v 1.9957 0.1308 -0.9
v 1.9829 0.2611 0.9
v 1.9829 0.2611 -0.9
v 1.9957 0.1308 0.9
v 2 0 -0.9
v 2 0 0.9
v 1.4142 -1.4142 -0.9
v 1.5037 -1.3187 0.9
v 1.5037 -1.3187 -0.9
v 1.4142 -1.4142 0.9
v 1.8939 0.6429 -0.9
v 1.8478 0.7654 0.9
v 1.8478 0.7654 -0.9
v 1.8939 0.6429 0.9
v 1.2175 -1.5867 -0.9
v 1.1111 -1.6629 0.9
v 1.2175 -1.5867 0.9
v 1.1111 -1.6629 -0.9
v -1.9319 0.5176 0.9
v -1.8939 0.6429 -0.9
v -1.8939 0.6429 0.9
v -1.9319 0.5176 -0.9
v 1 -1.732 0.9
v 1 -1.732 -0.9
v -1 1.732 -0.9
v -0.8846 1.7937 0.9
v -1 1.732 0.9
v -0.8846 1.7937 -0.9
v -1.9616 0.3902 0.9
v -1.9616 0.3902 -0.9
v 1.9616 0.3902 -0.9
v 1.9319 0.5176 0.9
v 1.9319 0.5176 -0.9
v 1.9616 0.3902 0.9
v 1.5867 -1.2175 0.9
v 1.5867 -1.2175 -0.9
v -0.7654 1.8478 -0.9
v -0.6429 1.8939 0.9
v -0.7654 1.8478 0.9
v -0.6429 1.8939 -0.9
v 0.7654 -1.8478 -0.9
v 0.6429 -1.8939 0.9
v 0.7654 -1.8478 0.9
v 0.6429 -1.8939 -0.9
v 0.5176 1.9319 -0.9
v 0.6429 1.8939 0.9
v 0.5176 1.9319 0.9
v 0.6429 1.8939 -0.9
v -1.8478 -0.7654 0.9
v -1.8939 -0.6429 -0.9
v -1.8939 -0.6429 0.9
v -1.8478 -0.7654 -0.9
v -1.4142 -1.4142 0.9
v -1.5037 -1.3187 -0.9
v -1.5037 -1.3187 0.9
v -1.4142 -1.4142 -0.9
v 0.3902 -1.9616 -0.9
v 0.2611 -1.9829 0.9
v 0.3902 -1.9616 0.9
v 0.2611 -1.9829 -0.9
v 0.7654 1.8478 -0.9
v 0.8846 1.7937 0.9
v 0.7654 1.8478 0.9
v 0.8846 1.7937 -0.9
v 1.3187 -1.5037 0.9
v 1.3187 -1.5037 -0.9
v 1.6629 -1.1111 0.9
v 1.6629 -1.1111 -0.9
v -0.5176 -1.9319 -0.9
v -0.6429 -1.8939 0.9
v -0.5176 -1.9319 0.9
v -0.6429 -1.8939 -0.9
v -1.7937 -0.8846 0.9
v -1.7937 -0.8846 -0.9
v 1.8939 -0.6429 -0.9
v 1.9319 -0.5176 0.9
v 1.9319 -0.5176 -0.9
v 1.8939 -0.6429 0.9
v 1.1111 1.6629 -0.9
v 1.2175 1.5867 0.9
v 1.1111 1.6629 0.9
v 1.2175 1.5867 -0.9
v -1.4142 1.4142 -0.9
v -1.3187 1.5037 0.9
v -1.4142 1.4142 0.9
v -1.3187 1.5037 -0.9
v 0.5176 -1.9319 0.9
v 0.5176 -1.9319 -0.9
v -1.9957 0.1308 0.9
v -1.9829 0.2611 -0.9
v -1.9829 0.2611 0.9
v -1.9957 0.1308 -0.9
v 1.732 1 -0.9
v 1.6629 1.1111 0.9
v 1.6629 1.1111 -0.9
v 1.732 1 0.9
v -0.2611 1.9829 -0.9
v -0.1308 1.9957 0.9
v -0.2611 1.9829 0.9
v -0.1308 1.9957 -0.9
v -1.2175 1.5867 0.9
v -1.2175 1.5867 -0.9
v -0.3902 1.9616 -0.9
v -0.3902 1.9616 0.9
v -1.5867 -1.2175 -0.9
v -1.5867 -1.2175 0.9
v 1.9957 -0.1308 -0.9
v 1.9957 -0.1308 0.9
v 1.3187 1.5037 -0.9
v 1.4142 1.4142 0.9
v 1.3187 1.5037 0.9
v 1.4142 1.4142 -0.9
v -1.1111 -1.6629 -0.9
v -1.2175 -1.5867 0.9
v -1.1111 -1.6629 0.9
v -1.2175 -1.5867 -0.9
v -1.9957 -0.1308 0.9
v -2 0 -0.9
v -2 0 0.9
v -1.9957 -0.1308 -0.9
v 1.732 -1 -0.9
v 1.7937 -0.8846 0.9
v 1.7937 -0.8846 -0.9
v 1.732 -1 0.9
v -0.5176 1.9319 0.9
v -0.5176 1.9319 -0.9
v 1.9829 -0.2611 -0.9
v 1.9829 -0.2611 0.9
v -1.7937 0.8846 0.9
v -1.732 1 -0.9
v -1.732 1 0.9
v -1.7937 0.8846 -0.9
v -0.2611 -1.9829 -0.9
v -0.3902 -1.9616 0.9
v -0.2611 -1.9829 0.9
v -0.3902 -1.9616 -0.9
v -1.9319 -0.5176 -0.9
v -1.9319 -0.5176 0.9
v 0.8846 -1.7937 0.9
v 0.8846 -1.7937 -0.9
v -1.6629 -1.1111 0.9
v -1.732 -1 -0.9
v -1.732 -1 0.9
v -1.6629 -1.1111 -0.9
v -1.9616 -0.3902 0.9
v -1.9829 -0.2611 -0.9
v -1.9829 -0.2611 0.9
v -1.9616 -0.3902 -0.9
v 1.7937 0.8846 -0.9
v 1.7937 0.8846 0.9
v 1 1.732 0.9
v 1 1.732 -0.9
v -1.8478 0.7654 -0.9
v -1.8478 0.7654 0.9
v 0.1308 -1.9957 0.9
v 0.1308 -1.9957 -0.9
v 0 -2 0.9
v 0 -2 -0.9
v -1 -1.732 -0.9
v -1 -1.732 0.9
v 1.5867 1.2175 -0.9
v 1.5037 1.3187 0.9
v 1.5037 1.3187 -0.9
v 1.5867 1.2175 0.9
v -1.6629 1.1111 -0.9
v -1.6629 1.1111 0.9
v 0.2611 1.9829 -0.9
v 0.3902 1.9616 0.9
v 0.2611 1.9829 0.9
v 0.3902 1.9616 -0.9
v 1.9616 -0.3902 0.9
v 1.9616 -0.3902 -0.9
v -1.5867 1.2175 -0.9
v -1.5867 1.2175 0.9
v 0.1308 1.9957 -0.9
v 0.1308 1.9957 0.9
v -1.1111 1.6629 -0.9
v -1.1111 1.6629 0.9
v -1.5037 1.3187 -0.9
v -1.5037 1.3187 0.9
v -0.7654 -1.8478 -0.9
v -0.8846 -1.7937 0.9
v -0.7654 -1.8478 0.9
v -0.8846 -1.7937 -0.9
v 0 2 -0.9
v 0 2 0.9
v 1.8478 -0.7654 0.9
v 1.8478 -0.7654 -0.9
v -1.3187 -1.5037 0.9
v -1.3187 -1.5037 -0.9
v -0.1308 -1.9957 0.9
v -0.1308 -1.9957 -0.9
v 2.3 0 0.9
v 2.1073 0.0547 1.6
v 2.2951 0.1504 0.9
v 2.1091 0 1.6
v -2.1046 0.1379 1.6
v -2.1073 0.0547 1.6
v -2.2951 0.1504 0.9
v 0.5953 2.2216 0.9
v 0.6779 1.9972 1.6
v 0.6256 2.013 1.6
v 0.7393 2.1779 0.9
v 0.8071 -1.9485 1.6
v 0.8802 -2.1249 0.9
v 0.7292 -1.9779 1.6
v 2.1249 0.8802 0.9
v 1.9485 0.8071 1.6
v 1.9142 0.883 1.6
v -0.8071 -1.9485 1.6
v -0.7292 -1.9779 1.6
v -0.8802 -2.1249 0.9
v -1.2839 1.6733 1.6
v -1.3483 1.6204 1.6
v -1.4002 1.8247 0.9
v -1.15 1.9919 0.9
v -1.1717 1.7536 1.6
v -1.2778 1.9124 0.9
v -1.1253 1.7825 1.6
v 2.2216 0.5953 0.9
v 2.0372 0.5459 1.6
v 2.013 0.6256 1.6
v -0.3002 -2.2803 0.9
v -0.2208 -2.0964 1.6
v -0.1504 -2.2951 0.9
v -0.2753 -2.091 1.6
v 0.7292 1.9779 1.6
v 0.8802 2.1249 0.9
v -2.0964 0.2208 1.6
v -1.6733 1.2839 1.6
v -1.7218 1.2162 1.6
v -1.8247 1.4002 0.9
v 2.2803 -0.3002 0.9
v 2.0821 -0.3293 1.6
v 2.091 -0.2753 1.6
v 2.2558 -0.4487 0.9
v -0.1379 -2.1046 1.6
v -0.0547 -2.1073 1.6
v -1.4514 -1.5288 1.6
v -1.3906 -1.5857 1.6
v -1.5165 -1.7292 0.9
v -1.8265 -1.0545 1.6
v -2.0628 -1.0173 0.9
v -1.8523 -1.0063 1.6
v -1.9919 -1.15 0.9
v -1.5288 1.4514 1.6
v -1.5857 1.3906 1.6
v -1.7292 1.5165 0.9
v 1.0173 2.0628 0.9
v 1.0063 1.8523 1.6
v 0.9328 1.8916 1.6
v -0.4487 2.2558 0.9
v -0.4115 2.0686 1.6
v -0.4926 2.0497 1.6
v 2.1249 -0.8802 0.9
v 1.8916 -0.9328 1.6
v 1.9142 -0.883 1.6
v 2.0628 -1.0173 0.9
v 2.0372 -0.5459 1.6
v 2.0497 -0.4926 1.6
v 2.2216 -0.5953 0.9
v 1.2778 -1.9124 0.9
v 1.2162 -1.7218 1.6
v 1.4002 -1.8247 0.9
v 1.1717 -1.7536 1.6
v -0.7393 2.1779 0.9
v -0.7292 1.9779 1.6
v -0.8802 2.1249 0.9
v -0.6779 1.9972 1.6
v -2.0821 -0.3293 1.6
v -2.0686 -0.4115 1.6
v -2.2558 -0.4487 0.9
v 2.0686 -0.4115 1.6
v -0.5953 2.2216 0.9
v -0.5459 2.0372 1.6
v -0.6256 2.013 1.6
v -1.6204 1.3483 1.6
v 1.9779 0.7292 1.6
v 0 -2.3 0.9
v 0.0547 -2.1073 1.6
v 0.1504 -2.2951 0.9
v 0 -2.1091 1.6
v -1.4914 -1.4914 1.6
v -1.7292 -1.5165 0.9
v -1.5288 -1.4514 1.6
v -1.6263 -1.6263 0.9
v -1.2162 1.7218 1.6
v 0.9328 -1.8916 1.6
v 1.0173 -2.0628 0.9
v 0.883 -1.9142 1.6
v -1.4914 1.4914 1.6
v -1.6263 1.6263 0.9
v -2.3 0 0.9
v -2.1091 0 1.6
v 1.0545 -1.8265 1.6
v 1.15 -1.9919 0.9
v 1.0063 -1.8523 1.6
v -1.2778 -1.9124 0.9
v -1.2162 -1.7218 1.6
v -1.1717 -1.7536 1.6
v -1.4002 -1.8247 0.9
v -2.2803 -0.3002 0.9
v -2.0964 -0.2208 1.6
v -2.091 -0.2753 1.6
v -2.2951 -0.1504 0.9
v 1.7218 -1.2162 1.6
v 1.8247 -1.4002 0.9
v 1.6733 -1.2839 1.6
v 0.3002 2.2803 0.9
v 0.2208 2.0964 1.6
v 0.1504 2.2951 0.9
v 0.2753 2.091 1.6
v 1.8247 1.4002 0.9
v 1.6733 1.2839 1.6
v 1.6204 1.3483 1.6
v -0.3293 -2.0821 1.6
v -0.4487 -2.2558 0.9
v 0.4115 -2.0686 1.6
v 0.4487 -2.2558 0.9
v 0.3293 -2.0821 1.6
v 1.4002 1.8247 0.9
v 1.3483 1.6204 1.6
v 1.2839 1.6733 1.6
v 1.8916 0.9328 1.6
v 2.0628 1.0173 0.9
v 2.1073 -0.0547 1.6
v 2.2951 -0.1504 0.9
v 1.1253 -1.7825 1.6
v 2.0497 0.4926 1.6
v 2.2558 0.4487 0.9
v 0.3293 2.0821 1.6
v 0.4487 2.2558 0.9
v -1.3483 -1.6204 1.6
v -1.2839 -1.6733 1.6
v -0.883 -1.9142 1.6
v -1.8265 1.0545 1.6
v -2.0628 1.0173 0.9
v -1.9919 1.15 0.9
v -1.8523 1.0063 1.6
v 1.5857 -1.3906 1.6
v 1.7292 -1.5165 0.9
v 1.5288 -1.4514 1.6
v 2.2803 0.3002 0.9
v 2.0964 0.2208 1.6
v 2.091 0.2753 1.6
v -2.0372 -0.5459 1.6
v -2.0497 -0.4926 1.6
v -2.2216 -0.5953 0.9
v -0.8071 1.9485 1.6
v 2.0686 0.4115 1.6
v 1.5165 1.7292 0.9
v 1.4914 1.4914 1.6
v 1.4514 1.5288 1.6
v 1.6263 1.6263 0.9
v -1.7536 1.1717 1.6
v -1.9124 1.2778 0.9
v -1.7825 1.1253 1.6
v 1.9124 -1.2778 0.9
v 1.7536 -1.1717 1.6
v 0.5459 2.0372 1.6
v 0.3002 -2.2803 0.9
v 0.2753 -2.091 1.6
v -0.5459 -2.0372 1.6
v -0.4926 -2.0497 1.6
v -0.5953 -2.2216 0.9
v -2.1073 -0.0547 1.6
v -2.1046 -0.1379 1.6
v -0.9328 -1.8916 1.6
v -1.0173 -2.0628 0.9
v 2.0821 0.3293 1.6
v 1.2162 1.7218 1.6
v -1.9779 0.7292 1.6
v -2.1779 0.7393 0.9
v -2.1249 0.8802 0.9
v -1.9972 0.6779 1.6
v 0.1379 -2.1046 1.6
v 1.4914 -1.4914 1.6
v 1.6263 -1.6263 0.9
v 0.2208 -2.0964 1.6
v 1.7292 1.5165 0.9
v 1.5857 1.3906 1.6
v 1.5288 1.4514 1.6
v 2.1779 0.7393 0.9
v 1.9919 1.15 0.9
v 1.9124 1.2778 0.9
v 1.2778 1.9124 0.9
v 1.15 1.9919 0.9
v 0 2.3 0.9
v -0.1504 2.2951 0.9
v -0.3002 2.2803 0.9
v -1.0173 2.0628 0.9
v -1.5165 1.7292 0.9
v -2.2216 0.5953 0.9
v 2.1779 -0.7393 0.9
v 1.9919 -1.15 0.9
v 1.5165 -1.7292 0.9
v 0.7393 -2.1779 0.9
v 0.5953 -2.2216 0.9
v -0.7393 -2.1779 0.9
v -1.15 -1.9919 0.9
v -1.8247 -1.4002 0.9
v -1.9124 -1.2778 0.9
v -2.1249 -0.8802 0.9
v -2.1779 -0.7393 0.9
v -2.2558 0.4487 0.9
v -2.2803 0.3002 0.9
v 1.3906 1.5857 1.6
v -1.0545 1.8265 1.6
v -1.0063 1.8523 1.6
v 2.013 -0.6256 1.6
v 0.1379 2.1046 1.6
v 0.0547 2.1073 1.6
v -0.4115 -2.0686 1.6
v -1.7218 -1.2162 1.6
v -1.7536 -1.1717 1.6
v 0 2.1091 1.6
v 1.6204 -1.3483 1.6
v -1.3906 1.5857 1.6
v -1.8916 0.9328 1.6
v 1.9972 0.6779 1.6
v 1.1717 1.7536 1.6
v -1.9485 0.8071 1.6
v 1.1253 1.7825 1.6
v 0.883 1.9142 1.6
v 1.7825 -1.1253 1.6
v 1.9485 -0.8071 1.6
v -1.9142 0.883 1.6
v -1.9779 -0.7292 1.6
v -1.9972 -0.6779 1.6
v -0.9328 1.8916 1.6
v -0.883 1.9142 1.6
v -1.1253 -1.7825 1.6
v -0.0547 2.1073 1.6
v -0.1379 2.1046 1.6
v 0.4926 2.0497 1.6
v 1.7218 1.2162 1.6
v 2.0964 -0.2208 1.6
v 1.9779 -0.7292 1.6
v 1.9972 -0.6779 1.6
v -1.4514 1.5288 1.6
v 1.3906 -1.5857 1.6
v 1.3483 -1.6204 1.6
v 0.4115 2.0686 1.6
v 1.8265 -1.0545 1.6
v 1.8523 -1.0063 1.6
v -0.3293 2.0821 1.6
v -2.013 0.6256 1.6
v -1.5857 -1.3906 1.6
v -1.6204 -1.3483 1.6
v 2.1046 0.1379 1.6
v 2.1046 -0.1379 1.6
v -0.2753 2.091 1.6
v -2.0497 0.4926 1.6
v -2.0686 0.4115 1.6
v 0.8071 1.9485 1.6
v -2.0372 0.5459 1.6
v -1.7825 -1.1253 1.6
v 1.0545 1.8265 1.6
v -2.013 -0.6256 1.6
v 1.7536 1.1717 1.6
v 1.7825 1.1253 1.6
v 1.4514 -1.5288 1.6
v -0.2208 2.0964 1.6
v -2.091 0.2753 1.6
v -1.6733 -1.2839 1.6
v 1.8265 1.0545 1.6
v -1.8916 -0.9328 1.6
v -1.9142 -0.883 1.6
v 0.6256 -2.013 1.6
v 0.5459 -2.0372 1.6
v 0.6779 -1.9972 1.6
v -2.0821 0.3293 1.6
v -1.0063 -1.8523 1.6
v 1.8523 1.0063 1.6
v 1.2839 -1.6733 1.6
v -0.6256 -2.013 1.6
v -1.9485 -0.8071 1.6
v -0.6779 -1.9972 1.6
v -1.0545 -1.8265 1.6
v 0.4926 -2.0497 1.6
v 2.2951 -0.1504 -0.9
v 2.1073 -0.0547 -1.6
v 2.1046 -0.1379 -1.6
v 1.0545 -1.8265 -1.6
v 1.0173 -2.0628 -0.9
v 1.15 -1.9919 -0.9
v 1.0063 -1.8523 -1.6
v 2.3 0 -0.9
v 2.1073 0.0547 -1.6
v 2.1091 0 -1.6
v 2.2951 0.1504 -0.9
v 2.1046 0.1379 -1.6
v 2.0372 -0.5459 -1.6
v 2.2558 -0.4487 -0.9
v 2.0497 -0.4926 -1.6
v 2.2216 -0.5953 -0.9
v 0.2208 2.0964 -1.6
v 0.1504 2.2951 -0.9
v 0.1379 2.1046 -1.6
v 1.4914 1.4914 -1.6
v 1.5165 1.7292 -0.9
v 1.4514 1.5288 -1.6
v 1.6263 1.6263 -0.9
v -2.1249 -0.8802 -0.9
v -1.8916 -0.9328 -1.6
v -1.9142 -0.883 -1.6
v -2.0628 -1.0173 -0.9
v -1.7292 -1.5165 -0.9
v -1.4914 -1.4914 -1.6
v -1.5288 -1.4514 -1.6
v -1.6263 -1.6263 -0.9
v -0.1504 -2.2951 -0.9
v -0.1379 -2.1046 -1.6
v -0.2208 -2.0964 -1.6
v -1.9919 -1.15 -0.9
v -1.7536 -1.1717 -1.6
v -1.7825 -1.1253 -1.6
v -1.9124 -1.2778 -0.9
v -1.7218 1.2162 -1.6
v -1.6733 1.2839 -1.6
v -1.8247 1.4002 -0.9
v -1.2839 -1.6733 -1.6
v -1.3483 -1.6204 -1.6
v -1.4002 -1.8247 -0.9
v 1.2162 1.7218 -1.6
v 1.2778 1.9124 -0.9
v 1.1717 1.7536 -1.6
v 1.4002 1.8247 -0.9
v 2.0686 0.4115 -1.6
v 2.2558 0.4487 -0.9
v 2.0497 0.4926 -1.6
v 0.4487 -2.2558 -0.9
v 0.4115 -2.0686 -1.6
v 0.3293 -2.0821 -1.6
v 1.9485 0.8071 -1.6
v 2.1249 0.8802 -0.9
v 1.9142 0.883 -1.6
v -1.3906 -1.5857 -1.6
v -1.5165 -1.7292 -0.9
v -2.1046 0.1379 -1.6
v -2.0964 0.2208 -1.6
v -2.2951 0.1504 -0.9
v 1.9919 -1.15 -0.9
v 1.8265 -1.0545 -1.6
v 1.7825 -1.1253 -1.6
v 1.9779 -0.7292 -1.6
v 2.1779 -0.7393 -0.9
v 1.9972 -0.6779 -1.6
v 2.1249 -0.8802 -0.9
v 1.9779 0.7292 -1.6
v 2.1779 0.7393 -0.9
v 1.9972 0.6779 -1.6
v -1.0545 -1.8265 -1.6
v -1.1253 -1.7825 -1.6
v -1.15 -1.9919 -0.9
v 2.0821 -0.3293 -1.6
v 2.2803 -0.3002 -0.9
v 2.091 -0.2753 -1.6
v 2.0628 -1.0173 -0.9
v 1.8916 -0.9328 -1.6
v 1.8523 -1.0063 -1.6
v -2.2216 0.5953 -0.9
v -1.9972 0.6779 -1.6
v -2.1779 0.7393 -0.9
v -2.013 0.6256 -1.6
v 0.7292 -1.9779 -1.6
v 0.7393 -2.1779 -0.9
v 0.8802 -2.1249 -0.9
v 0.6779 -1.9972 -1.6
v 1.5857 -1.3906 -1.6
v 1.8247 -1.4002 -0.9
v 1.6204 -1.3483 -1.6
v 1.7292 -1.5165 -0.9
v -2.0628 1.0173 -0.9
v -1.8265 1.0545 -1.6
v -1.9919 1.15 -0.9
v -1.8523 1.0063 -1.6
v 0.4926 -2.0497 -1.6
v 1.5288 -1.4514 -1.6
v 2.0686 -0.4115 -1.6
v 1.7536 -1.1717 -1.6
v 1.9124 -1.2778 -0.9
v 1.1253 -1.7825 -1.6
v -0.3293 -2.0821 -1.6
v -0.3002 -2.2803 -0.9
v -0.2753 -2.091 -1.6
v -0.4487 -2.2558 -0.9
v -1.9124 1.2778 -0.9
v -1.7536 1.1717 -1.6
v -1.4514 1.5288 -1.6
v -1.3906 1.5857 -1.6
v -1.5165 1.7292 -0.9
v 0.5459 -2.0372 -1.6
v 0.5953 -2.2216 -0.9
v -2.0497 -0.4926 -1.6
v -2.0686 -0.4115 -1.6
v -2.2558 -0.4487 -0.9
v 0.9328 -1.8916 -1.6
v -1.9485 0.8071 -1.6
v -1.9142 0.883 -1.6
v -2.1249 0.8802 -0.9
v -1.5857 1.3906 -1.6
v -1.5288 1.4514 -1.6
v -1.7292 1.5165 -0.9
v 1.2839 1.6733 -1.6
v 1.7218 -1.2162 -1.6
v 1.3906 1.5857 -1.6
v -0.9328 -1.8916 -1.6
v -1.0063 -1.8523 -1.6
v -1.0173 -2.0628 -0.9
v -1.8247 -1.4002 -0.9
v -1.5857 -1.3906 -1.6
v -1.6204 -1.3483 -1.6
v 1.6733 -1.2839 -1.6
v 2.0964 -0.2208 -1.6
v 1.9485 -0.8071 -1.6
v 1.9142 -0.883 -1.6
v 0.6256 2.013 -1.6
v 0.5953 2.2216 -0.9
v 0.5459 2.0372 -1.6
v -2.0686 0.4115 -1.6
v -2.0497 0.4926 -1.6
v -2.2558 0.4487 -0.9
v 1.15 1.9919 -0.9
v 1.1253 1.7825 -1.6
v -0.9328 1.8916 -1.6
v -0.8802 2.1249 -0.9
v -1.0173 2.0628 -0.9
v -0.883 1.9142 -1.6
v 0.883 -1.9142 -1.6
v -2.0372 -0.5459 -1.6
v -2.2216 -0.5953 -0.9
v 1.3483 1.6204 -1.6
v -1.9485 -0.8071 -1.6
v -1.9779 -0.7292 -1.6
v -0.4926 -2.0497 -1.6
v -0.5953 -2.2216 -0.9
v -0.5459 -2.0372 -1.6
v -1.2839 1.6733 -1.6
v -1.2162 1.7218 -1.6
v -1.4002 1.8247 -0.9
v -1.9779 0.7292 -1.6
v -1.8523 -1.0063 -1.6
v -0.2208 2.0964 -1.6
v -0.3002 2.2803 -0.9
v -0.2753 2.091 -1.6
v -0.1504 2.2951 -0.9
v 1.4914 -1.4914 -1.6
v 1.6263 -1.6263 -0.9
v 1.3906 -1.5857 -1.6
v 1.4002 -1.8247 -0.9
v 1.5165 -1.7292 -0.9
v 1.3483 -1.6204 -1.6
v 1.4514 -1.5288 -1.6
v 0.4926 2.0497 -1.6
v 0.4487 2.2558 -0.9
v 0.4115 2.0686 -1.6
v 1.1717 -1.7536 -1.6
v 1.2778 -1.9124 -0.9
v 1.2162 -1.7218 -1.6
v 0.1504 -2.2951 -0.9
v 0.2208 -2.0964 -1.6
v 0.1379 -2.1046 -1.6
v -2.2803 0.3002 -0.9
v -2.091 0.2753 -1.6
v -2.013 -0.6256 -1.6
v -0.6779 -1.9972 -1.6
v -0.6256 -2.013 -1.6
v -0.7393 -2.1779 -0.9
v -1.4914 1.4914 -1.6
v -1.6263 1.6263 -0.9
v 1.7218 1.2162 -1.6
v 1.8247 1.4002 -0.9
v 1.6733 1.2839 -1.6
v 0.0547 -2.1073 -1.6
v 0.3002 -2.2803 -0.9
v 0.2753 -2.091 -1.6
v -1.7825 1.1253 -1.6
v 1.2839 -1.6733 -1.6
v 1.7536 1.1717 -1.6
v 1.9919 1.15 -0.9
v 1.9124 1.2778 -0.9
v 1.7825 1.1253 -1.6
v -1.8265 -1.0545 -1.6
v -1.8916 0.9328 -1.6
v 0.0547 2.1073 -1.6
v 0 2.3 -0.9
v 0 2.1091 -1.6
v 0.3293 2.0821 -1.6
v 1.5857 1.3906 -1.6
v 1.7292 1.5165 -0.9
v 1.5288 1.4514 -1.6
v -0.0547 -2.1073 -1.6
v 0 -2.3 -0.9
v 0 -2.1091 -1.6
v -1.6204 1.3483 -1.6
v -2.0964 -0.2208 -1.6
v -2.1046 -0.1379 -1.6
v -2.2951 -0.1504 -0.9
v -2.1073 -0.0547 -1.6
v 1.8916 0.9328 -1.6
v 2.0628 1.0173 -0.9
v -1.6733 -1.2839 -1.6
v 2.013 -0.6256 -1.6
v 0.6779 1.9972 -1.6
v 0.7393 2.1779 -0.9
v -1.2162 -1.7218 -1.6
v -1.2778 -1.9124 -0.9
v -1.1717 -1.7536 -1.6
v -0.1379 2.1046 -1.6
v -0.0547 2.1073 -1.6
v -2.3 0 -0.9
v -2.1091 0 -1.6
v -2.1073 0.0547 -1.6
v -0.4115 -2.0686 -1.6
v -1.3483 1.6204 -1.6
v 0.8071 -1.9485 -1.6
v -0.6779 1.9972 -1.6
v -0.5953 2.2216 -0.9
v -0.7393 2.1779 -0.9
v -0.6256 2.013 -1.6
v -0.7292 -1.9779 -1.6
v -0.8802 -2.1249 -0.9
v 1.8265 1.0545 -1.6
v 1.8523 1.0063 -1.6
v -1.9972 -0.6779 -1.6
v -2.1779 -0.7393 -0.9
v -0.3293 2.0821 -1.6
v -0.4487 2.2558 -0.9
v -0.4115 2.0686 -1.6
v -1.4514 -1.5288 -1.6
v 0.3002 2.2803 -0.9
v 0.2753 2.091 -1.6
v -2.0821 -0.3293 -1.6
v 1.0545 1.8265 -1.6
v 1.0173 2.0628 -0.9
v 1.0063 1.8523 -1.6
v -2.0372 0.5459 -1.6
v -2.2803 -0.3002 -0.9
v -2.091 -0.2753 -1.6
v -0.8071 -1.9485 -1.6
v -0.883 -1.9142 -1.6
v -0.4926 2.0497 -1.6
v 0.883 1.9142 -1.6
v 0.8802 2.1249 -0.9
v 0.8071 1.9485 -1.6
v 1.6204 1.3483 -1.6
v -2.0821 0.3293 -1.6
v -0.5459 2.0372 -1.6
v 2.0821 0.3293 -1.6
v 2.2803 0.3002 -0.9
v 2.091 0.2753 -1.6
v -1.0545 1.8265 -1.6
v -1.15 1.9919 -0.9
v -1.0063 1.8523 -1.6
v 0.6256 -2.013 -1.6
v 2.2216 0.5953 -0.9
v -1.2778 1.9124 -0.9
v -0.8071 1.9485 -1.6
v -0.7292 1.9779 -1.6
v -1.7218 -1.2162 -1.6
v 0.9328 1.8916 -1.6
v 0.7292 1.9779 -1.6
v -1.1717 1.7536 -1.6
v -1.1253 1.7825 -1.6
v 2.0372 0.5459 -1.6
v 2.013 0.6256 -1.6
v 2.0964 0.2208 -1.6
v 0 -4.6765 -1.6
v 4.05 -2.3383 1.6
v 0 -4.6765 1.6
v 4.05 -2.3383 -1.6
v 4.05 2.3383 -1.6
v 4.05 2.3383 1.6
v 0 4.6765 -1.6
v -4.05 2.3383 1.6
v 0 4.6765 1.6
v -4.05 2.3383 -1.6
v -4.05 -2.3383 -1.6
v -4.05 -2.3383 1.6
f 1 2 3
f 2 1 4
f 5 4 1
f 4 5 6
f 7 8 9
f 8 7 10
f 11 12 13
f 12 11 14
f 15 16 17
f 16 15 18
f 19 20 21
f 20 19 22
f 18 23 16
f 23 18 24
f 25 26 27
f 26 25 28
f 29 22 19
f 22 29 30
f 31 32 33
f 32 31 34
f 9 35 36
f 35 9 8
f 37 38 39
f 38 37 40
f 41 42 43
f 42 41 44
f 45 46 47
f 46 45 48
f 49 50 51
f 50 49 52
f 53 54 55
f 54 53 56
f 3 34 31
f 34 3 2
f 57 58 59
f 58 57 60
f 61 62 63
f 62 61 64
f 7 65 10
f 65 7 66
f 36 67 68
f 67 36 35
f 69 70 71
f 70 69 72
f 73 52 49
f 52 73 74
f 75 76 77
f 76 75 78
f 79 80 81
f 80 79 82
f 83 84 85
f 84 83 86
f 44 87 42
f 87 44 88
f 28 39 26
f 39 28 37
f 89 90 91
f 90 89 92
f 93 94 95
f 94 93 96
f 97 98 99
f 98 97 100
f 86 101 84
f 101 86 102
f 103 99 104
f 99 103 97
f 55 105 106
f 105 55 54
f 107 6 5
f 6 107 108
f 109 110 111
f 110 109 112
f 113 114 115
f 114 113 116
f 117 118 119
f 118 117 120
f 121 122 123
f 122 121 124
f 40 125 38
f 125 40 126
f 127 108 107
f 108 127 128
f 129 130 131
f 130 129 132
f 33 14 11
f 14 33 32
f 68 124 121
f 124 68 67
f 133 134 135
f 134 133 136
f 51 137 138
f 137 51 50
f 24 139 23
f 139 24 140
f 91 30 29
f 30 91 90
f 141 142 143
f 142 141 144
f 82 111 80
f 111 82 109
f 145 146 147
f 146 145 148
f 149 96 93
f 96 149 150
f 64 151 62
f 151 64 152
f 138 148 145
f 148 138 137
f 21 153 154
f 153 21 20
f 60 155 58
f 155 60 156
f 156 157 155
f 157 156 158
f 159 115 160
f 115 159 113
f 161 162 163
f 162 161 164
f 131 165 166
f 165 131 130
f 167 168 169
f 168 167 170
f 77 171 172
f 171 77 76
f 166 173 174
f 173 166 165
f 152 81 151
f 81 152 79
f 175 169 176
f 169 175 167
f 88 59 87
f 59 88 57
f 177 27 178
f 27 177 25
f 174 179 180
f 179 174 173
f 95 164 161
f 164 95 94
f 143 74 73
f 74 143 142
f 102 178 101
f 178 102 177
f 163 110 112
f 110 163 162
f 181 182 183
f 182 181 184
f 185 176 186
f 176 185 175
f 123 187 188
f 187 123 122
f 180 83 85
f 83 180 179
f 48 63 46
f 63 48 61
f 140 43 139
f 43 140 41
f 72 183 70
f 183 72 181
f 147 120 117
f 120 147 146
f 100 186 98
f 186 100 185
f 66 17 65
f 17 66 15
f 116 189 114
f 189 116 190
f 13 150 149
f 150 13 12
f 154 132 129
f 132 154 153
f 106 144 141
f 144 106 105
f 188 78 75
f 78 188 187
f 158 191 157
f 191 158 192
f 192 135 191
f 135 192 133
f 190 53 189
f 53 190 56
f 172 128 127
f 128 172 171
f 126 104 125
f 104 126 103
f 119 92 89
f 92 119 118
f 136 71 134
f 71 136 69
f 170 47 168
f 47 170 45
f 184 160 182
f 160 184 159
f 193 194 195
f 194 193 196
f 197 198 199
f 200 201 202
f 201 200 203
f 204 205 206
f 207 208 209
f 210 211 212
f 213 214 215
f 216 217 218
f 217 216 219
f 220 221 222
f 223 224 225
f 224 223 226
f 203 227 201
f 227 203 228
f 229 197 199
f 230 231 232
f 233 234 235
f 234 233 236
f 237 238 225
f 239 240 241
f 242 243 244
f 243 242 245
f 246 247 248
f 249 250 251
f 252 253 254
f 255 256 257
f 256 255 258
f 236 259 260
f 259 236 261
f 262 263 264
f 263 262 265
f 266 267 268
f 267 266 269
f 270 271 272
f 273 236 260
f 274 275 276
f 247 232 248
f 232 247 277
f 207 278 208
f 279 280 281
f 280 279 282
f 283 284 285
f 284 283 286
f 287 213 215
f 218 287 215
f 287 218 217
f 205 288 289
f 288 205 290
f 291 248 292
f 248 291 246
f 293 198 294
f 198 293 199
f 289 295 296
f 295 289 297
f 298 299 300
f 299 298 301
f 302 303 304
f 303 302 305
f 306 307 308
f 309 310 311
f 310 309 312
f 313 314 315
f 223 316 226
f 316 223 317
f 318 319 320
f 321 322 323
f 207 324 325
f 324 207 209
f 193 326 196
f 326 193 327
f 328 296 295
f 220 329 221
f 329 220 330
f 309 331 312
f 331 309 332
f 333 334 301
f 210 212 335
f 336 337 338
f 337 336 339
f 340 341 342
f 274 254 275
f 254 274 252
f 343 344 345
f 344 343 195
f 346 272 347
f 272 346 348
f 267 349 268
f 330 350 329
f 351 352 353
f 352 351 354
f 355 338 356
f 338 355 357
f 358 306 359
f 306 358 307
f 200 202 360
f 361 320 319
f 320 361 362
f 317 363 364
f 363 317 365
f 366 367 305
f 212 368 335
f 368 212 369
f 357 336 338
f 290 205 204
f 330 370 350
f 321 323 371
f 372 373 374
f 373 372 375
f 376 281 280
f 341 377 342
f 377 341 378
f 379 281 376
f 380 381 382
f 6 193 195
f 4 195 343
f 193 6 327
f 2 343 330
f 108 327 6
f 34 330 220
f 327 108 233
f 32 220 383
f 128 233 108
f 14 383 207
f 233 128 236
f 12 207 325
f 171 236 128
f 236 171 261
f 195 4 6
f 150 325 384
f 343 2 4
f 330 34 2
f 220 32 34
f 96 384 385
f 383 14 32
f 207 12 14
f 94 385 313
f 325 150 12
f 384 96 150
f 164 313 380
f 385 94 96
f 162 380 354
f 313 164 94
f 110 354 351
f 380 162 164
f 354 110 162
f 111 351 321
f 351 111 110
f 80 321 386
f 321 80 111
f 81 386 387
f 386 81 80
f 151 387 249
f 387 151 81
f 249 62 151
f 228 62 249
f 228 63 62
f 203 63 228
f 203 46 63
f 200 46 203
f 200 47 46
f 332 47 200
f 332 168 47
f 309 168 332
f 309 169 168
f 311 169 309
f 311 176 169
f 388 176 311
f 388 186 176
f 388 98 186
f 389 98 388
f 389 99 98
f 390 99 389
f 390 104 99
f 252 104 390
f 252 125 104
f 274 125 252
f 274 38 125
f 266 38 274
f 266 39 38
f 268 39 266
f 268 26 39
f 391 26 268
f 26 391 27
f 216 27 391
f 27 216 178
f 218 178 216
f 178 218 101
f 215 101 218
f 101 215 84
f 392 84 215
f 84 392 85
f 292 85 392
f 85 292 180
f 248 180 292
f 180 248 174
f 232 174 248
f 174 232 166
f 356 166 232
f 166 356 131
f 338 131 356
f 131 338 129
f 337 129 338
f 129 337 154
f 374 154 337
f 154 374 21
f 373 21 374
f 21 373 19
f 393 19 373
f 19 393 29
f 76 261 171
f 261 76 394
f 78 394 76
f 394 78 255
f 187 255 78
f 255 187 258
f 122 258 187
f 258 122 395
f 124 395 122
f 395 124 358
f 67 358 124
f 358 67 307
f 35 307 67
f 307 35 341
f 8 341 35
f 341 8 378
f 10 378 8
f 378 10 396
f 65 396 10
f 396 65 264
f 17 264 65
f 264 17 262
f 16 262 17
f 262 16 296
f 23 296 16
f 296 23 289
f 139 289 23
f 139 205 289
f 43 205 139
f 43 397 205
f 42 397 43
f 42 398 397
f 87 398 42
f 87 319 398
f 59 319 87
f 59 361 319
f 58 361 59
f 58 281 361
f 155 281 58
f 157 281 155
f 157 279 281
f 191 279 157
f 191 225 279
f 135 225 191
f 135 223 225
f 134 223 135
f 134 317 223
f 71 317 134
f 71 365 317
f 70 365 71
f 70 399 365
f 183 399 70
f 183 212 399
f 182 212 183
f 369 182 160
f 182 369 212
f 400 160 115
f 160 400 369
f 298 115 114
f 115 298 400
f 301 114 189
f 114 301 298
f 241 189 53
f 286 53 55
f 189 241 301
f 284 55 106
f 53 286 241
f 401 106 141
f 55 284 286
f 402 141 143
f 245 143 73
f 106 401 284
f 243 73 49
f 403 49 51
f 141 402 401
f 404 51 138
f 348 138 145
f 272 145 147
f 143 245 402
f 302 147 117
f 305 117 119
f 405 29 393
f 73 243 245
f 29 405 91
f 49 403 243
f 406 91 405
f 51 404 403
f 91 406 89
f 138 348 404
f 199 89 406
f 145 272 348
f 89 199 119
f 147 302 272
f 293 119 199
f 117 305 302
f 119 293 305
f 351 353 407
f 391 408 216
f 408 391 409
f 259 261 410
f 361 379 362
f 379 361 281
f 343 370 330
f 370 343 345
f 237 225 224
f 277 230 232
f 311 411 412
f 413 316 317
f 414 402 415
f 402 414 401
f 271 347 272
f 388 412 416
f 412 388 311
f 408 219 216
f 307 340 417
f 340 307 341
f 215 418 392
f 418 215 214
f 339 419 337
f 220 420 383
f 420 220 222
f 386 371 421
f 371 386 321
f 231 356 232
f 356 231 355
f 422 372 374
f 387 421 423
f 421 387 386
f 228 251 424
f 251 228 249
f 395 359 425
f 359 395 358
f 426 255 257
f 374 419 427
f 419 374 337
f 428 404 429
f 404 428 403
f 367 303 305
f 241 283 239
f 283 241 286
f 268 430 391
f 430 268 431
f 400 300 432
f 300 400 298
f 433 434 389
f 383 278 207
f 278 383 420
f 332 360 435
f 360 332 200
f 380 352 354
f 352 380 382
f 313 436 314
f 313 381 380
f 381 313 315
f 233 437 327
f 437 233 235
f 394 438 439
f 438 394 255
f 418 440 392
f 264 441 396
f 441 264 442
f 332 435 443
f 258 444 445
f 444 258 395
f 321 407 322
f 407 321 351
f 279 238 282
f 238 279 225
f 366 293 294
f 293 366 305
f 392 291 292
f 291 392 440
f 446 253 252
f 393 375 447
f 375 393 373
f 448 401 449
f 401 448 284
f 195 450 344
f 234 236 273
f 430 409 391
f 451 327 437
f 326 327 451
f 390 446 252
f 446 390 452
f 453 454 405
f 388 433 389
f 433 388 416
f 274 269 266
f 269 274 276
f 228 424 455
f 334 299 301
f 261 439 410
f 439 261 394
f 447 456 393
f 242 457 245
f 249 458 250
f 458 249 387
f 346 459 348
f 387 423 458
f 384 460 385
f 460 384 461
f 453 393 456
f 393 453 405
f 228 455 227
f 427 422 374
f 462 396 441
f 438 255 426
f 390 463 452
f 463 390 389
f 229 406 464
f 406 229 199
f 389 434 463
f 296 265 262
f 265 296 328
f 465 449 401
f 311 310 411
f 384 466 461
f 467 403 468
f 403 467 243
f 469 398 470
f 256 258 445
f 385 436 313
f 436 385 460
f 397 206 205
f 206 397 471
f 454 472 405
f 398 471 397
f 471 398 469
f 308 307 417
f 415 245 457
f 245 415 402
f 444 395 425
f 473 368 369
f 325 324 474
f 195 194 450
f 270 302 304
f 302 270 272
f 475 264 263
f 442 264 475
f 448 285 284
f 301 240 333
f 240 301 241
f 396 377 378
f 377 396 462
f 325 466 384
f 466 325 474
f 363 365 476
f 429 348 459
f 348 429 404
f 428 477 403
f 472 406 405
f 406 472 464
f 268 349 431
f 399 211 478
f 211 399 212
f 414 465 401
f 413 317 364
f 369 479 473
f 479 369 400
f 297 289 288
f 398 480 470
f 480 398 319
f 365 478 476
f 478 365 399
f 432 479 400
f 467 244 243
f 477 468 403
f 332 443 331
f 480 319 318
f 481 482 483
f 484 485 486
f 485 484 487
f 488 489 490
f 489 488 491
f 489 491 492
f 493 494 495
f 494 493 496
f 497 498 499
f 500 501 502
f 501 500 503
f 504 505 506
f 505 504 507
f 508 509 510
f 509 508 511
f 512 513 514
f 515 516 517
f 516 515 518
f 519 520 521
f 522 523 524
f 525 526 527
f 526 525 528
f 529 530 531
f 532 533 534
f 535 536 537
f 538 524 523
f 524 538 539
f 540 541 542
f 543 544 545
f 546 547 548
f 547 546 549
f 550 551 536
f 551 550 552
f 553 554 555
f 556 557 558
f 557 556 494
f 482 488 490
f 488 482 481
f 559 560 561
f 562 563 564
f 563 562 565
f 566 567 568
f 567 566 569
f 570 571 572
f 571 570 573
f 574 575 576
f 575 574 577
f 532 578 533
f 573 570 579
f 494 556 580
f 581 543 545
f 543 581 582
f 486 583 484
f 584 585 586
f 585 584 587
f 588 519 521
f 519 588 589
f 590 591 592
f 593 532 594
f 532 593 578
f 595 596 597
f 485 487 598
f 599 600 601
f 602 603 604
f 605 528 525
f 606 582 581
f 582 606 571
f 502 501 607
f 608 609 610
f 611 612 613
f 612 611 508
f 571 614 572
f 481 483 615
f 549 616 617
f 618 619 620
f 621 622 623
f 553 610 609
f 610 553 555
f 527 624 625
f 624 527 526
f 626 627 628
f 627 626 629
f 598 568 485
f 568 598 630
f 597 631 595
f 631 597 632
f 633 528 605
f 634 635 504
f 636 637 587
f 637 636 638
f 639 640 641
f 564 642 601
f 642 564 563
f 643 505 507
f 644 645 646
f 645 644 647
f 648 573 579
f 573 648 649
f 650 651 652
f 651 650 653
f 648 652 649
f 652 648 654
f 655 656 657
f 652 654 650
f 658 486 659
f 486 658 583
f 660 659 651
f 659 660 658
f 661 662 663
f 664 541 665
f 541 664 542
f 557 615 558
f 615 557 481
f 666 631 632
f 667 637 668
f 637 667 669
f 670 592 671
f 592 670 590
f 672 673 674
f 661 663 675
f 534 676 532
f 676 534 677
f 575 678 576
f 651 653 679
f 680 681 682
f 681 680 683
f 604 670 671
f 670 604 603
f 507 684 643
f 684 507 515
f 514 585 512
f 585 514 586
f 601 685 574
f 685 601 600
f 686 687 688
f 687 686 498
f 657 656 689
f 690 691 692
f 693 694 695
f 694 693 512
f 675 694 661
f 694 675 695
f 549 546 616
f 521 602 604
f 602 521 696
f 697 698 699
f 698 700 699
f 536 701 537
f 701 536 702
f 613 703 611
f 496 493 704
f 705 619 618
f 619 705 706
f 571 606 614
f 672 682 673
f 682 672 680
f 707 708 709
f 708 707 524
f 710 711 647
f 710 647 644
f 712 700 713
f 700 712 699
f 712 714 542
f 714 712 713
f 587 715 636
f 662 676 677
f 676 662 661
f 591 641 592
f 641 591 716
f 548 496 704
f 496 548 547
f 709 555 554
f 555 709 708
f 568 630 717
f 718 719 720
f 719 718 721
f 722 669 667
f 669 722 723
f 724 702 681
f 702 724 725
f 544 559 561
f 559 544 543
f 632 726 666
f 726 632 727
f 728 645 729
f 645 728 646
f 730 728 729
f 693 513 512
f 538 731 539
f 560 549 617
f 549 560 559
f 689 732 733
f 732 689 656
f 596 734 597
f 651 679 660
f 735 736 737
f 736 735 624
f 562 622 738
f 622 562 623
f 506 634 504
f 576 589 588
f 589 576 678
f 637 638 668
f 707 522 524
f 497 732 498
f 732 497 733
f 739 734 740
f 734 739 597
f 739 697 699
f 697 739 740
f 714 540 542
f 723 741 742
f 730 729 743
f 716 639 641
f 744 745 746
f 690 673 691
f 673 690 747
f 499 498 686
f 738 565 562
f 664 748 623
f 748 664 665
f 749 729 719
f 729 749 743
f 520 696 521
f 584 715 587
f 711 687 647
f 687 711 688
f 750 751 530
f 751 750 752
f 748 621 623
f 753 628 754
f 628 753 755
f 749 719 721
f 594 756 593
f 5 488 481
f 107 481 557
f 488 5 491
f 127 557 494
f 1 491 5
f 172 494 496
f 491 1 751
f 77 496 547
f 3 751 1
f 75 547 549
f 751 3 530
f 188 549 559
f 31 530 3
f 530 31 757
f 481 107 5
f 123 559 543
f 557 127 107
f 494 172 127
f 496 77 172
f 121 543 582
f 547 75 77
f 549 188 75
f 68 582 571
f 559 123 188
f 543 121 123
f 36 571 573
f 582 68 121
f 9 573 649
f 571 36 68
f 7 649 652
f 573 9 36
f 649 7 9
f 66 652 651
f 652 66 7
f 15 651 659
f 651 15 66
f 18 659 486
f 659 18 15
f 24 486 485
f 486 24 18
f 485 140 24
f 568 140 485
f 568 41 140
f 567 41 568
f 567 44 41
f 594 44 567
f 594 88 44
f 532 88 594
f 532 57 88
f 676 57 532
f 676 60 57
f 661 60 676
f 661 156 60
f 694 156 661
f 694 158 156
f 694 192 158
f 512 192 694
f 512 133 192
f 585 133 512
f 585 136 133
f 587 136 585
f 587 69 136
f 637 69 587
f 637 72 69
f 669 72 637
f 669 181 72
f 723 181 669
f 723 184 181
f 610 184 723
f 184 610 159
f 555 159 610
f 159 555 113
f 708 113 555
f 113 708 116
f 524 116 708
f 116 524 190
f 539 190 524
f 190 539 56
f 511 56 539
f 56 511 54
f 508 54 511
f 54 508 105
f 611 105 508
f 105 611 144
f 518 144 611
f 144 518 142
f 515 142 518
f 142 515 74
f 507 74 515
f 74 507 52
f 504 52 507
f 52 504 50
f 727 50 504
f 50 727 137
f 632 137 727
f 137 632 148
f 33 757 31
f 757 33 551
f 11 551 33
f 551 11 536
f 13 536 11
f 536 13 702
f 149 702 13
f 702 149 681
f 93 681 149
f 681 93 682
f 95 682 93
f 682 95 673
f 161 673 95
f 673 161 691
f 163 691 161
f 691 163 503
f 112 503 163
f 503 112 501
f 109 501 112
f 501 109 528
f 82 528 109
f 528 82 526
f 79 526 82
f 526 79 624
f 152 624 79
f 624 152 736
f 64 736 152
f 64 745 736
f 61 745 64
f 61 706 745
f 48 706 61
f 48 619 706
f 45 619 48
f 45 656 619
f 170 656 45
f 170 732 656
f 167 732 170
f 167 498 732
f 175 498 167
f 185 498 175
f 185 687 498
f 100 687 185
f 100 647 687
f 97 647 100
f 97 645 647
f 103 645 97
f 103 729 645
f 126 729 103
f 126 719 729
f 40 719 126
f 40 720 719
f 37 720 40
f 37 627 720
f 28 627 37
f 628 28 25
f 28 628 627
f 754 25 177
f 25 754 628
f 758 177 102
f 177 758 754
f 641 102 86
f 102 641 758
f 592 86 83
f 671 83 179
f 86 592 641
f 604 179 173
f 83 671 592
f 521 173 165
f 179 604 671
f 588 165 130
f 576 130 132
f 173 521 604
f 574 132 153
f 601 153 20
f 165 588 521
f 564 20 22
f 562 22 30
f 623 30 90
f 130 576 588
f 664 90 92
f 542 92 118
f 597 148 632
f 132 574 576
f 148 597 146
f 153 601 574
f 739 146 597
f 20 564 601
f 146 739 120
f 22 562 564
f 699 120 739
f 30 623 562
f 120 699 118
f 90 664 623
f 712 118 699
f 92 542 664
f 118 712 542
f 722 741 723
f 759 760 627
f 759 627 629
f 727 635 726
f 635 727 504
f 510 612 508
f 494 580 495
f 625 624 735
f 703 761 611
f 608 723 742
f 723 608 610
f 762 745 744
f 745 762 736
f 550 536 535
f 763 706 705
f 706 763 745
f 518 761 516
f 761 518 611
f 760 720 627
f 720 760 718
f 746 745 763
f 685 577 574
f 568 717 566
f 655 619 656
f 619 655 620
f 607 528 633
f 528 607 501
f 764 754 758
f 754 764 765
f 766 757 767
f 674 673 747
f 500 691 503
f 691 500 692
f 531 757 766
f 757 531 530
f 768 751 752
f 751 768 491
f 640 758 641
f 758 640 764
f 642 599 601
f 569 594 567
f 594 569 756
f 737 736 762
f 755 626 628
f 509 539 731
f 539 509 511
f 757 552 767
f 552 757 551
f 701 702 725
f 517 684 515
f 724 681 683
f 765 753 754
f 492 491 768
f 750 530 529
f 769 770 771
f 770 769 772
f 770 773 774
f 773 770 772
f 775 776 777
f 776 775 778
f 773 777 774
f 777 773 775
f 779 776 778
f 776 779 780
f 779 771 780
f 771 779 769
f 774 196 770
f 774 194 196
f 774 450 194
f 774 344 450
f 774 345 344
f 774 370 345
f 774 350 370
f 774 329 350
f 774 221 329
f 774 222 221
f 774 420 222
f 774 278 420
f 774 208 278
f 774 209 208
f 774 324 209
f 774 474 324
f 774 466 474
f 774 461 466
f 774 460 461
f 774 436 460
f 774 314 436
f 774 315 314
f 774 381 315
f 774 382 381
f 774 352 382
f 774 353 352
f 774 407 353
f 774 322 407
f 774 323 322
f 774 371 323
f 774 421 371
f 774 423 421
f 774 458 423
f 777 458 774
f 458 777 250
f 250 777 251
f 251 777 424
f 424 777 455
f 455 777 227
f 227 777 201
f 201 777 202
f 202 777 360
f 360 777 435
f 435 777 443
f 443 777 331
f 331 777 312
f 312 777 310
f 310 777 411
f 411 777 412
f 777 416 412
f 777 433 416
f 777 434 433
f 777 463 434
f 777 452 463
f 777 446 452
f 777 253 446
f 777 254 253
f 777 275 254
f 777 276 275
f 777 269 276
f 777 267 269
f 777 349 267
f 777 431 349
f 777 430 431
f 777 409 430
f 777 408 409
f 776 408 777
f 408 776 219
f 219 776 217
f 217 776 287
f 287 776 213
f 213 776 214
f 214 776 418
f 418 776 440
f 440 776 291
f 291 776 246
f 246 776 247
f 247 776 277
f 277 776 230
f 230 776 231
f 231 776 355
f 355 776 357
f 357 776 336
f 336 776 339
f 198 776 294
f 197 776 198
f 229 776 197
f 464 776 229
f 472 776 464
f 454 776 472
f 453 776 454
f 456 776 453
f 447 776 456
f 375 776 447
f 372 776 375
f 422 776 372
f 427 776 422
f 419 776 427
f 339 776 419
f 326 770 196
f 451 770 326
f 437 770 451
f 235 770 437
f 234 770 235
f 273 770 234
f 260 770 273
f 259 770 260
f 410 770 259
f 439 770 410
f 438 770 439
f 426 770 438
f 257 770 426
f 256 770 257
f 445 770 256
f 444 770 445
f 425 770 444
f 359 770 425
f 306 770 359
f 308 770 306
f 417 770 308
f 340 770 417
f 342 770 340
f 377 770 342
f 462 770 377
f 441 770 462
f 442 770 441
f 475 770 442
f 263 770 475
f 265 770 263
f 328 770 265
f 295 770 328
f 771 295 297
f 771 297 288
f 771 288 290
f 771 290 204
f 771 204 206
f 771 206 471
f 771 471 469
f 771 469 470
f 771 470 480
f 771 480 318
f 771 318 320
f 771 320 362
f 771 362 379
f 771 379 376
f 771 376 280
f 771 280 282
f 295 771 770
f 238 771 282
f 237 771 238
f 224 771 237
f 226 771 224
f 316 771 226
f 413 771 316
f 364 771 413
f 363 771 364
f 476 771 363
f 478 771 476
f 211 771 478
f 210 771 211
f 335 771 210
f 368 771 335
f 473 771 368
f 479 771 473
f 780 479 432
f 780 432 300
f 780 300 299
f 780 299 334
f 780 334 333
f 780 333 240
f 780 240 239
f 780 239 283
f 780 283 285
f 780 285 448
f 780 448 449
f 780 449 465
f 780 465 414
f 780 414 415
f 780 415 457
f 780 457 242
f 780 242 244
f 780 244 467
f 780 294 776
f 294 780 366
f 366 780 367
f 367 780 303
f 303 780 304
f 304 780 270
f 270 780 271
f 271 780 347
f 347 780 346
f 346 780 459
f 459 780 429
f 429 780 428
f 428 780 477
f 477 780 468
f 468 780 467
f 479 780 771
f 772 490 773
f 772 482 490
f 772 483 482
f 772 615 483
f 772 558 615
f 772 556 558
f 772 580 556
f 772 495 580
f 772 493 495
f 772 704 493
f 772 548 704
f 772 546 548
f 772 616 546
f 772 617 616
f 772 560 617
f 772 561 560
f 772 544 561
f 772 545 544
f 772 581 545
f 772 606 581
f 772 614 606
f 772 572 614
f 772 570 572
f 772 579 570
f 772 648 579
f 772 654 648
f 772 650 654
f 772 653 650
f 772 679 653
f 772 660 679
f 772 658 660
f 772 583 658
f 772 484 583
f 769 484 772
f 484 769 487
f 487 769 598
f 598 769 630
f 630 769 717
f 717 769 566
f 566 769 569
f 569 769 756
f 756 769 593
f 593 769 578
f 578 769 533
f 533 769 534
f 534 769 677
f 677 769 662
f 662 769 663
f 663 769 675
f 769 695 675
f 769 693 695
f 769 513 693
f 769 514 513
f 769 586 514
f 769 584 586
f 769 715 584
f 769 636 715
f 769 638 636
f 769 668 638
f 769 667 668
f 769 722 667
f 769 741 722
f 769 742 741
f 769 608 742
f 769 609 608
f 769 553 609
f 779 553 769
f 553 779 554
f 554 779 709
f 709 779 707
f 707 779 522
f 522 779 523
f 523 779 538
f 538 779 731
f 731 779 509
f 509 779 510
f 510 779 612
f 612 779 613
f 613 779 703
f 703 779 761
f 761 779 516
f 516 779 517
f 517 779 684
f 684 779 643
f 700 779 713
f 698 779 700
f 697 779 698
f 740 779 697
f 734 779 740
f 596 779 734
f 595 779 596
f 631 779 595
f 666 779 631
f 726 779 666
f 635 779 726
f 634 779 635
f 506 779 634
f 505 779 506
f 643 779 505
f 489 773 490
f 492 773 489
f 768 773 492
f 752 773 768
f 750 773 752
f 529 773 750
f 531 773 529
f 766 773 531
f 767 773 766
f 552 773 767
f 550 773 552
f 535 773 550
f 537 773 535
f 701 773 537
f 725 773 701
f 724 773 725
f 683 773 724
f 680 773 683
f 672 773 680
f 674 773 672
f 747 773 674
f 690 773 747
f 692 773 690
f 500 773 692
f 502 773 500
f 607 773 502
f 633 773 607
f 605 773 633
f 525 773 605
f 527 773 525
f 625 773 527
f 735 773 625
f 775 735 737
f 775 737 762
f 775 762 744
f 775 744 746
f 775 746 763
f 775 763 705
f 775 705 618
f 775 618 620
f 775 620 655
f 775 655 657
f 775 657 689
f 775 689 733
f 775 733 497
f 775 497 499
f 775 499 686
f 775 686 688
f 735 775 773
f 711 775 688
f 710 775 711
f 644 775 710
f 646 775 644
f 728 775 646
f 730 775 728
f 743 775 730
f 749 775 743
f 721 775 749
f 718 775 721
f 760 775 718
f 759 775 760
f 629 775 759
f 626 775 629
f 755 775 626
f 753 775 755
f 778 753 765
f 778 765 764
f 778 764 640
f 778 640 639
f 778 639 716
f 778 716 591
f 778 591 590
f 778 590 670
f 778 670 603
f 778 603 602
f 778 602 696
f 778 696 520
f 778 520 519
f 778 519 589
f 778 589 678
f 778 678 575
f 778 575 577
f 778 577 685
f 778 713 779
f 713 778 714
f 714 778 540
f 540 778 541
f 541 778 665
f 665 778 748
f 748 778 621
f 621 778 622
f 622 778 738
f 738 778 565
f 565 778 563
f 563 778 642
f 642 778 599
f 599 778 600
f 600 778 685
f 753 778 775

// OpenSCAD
$fn = 96;

// Parameters (mm)
across_flats   = 8.1;   // hex width across flats
thickness      = 3.2;   // nut thickness
hole_diameter  = 4.0;   // through hole
chamfer_size   = 0.3;   // lead-in
overlap        = 0.8;   // boolean safety

// Derived
hole_r = hole_diameter/2;

// For a regular hex: across_flats = 2*apothem, apothem = R*cos(30) => R = across_flats/sqrt(3)
hex_R = across_flats / sqrt(3);

module hex_prism(h, R) {
    // 6-flat hex prism, centered
    rotate([0,0,30]) cylinder(h=h, r=R, $fn=6, center=true);
}

module hole_with_chamfers() {
    union() {
        // Straight through-hole
        cylinder(h=thickness + 2*overlap, r=hole_r, center=true);

        // Top chamfer (connected via overlap)
        translate([0, 0, thickness/2 - chamfer_size/2])
            cylinder(h=chamfer_size + overlap, r1=hole_r + chamfer_size, r2=hole_r, center=true);

        // Bottom chamfer
        translate([0, 0, -thickness/2 + chamfer_size/2])
            cylinder(h=chamfer_size + overlap, r1=hole_r, r2=hole_r + chamfer_size, center=true);
    }
}

difference() {
    // Ensure correct orientation for all orthographic views (Z is thickness axis)
    hex_prism(thickness, hex_R);
    hole_with_chamfers();
}
